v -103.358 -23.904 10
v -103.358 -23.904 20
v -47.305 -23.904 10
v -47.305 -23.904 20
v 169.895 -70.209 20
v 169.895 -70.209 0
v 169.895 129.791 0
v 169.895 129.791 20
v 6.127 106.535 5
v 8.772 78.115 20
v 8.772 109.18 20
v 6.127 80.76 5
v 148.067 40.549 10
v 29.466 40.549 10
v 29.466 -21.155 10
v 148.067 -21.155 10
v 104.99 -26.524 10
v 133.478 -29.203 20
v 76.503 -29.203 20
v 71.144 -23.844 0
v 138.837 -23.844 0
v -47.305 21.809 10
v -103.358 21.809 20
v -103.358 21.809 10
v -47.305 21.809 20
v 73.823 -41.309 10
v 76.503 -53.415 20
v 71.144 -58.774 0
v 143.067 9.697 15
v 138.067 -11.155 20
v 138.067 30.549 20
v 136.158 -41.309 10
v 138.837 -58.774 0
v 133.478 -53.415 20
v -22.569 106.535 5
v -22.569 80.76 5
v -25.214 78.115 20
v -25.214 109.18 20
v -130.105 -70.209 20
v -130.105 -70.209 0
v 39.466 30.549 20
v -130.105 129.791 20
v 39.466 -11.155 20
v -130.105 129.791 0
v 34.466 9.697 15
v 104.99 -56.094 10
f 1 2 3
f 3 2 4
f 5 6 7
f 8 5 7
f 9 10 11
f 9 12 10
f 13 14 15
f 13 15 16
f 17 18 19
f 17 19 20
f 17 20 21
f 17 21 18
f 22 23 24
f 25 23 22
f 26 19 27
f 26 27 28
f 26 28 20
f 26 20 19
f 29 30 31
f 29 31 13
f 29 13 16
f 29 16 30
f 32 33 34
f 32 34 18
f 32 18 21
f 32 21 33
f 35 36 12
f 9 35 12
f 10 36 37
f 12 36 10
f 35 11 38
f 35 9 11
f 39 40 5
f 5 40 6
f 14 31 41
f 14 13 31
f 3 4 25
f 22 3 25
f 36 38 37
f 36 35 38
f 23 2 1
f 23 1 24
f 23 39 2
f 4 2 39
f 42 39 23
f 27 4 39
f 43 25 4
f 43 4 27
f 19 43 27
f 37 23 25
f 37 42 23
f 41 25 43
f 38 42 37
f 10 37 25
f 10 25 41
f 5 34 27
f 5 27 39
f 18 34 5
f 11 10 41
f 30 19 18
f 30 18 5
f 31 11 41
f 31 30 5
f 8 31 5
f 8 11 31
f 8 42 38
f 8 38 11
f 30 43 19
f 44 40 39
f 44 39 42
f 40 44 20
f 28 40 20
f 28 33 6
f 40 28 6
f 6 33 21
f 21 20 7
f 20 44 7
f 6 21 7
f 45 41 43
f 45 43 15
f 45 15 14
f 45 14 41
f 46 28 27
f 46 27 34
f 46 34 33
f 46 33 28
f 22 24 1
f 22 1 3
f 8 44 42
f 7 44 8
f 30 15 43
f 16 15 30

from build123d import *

# Parameters (mm, degrees)
F0_W      = 300
F0_H      = 200
F1_DEPTH  = 20
F2_W      = 56.0527034104
F2_H      = 45.7135215402
F3_DEPTH  = 10
F4_W      = 66.9058933854
F4_H      = 34.0227484703
F5_DEPTH  = 10
F6_W      = 98.600897938
F6_H      = 41.7043203488
F7_DEPTH  = 10
F7_TAPER  = -45
F8_W      = 32.641120255
F8_H      = 31.1660170555
F9_DEPTH  = 10
F9_TAPER  = -20
F10_W     = 33.9855737984
F10_H     = 31.0657545924
F11_DEPTH = 15
F11_TAPER = 10
F12_W     = 56.9754764438
F12_H     = 24.2112912238
F13_DEPTH = 25
F13_TAPER = -15


with BuildPart() as f1:
    # F0 (on Top) → F1 (new body)
    with BuildSketch(Plane.XY):
        with Locations((19.8950484647, 29.7908782959)):
            Rectangle(F0_W, F0_H)
    extrude(amount=F1_DEPTH)

    # F2 (on face) → F3 (cut)
    with BuildSketch(Plane.XY.offset(20)):
        with Locations((-75.3318350762, -1.0474342853)):
            Rectangle(F2_W, F2_H)
    extrude(amount=-F3_DEPTH, mode=Mode.SUBTRACT)

    # F4 (on face) → F5 (join)
    with BuildSketch(Plane.XY.offset(20)):
        with Locations((92.6642976701, 79.7481462359)):
            Rectangle(F4_W, F4_H)
    extrude(amount=-F5_DEPTH)

    # F6 (on face) → F7 (cut)
    with BuildSketch(Plane.XY.offset(20)):
        with Locations((88.7664388865, 9.6967569552)):
            Rectangle(F6_W, F6_H)
    extrude(amount=-F7_DEPTH, taper=F7_TAPER, mode=Mode.SUBTRACT)

    # F8 (on face) → F9 (join)
    with BuildSketch(Plane.XY.offset(20)):
        with Locations((-97.8116877377, 101.3978421688)):
            Rectangle(F8_W, F8_H)
    extrude(amount=-F9_DEPTH, taper=F9_TAPER)

    # F10 (on face) → F11 (cut)
    with BuildSketch(Plane.XY.offset(20)):
        with Locations((-8.2211010158, 93.6475135386)):
            Rectangle(F10_W, F10_H)
    extrude(amount=-F11_DEPTH, taper=F11_TAPER, mode=Mode.SUBTRACT)

    # F12 (on face) → F13 (cut)
    with BuildSketch(Plane.XY.offset(20)):
        with Locations((104.9904711545, -41.3090791553)):
            Rectangle(F12_W, F12_H)
    extrude(amount=-F13_DEPTH, taper=F13_TAPER, mode=Mode.SUBTRACT)


solid = f1.part
